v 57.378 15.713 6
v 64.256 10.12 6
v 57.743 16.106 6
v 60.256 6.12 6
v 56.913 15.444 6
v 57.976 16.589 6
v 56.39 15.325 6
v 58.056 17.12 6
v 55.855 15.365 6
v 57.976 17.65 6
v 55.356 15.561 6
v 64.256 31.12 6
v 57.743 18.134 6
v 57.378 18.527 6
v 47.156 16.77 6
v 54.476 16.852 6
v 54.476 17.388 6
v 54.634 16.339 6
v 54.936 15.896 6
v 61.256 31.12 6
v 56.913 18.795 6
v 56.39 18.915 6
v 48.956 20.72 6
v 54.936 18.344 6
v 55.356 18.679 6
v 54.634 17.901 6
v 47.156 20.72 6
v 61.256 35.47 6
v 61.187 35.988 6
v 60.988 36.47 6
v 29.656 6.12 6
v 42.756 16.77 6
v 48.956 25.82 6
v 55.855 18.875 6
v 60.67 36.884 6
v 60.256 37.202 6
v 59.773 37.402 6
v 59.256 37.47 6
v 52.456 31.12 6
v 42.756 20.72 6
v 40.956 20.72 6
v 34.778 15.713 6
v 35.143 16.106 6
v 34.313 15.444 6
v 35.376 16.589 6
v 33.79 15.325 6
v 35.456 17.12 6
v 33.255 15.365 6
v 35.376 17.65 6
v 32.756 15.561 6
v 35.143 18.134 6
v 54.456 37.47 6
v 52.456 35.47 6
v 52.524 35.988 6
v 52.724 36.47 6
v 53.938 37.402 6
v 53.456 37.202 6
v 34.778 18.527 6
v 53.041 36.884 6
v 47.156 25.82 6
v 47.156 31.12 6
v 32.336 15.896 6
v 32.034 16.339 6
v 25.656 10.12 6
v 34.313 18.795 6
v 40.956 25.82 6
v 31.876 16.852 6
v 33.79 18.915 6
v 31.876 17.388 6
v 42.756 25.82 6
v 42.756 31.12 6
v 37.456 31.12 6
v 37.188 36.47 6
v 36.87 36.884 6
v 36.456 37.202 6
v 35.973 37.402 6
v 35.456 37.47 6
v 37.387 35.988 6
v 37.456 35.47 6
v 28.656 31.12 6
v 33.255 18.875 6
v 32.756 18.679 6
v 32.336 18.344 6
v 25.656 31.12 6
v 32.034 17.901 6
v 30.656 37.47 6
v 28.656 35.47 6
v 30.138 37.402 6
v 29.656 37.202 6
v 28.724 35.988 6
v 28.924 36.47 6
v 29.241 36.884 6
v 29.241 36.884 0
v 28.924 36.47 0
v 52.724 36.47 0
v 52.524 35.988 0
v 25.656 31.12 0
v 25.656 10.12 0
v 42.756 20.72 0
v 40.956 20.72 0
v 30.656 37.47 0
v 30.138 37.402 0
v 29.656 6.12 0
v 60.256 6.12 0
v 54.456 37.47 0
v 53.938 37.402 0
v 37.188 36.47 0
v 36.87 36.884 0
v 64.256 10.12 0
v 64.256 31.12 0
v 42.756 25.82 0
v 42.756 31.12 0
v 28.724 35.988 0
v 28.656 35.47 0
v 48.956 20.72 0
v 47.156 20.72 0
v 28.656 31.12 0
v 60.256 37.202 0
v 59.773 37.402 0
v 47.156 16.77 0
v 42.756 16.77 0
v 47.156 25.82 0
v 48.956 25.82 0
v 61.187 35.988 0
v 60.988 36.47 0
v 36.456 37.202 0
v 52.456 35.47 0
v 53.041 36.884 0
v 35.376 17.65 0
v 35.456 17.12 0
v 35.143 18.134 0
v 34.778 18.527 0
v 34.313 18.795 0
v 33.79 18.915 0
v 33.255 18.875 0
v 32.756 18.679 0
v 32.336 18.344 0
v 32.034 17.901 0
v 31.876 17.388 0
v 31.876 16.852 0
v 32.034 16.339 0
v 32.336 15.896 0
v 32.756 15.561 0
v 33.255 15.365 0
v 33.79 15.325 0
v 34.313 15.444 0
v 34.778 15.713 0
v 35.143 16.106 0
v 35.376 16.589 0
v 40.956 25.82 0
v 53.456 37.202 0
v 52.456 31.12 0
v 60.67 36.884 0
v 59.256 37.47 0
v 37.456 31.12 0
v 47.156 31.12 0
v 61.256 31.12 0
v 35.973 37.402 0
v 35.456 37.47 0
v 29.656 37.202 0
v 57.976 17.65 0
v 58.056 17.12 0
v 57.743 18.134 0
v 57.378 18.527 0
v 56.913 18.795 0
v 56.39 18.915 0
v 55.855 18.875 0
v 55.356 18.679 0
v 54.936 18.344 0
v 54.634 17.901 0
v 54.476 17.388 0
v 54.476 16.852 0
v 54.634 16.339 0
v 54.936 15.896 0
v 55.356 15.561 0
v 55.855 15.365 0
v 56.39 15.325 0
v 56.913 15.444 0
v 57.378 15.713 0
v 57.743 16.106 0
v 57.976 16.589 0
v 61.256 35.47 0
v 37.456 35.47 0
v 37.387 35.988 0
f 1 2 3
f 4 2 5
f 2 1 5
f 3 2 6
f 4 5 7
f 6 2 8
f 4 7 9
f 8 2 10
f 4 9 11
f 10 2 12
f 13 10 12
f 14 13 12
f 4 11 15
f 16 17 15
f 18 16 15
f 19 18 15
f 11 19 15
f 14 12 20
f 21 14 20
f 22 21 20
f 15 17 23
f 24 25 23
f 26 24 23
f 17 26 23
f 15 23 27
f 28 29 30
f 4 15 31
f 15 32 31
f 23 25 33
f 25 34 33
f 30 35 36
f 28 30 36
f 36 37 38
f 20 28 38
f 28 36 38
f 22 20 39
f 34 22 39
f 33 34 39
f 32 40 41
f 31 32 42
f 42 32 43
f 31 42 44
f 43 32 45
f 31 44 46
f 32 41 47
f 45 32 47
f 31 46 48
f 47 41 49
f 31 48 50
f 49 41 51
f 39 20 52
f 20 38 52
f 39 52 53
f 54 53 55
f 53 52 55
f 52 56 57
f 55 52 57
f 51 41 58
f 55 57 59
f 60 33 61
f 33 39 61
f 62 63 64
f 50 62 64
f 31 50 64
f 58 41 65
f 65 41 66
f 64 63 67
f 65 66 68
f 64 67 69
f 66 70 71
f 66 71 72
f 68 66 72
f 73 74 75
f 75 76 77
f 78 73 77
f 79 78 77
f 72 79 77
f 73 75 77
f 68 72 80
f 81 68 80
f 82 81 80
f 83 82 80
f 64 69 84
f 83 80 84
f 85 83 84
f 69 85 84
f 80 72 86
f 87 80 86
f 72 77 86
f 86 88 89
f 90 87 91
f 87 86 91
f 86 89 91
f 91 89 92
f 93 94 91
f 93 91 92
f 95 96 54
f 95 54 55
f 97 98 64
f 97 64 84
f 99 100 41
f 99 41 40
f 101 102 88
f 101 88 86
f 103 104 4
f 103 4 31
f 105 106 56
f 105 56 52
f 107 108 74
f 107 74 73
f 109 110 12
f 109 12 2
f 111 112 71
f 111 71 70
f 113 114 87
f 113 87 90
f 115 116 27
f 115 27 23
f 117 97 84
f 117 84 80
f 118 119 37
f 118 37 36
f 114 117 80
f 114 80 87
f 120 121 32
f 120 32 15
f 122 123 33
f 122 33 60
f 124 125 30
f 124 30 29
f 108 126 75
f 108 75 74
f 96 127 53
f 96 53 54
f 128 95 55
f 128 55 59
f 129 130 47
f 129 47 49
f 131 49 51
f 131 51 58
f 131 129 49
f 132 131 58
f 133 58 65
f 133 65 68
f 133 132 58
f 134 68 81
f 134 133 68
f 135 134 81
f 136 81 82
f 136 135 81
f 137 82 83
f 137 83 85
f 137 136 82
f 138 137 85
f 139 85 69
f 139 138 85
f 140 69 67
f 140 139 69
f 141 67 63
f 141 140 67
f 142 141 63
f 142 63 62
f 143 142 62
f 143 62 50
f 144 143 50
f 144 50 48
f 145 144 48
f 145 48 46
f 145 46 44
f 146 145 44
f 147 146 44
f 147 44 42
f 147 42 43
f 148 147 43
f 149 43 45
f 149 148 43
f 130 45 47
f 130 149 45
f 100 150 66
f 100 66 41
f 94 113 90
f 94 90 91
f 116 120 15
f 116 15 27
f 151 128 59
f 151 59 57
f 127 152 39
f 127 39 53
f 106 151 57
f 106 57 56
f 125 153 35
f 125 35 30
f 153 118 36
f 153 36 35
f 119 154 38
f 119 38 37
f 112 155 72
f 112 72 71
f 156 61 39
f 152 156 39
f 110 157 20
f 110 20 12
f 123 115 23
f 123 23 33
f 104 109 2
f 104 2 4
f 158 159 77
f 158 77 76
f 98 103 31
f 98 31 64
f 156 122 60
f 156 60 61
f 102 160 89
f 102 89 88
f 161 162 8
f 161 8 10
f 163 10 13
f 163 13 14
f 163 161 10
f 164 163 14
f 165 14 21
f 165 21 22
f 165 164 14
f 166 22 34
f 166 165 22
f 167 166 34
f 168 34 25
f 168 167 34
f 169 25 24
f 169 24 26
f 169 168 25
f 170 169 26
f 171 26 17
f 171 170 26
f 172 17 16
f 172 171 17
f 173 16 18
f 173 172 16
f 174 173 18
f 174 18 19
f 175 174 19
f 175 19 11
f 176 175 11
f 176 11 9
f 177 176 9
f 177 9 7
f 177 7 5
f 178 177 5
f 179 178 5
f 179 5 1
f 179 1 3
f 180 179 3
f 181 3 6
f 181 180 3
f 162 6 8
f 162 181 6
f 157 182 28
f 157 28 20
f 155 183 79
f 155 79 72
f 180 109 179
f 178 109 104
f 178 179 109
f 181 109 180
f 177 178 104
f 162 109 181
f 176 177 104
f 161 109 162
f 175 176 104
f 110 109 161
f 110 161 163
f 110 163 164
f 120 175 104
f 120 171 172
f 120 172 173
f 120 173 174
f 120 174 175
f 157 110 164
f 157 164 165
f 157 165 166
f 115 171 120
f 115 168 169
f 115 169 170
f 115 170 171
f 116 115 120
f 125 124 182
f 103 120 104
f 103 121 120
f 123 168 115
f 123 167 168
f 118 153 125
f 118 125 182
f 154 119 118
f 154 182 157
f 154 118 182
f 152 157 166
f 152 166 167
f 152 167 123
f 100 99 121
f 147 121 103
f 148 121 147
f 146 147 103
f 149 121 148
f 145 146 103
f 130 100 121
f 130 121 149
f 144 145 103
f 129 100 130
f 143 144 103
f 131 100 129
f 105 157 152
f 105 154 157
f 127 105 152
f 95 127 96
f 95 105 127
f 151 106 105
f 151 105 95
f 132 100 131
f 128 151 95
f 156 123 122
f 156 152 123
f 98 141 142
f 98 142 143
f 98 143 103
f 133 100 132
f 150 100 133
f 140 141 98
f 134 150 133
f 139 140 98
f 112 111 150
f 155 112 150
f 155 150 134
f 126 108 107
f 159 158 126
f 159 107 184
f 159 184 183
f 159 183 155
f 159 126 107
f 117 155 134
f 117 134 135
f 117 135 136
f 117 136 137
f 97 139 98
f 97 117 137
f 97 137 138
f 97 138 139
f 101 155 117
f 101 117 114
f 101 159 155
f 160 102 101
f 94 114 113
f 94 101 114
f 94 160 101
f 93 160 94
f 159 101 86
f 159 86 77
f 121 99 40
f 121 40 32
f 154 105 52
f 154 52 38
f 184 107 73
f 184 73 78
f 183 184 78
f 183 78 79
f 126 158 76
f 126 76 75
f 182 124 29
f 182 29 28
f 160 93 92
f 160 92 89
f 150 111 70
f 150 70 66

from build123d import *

# Parameters (mm, degrees)
MODEL_R                  = 1.8
RESSALTO_EXTRUS_O1_DEPTH = 6


with BuildPart() as part:
    # Model → Ressalto-extrusão1 (new body)
    with BuildSketch(Plane.XY):
        Polygon((53.041414253, 36.88413465), (53.455627815, 37.201971895), (53.937989725, 37.40177274), (54.455627815, 37.469921087), (59.255622257, 37.469921087), (59.773260347, 37.40177274), (60.255622257, 37.201971895), (60.66983582, 36.88413465), (60.987673065, 36.469921087), (61.18747391, 35.987559177), (61.255622257, 35.469921087), (61.255622257, 31.119923196), (64.255622257, 31.119923196), (64.255622257, 10.119923196), (60.255622257, 6.119923196), (29.655637917, 6.119923196), (25.655637917, 10.119923196), (25.655637917, 31.119923196), (28.655637917, 31.119923196), (28.655637917, 35.469921087), (28.723786264, 35.987559177), (28.923587109, 36.469921087), (29.241424354, 36.88413465), (29.655637917, 37.201971895), (30.137999826, 37.40177274), (30.655637917, 37.469921087), (35.455633882, 37.469921087), (35.973271972, 37.40177274), (36.455633882, 37.201971895), (36.869847444, 36.88413465), (37.187684689, 36.469921087), (37.387485534, 35.987559177), (37.455633882, 35.469921087), (37.455633882, 31.119923196), (42.755625888, 31.119923196), (42.755625888, 25.819924374), (40.955627657, 25.819924374), (40.955627657, 20.71992661), (42.755625888, 20.71992661), (42.755625888, 16.769926787), (47.15563056, 16.769926787), (47.15563056, 20.71992661), (48.955628792, 20.71992661), (48.955628792, 25.819924374), (47.15563056, 25.819924374), (47.15563056, 31.119923196), (52.455627815, 31.119923196), (52.455627815, 35.469921087), (52.523776162, 35.987559177), (52.723577008, 36.469921087), align=None)
        with Locations((56.255622257, 17.119923196)):
            Circle(MODEL_R, mode=Mode.SUBTRACT)
        with Locations((33.655637917, 17.119923196)):
            Circle(MODEL_R, mode=Mode.SUBTRACT)
    extrude(amount=RESSALTO_EXTRUS_O1_DEPTH)


solid = part.part
